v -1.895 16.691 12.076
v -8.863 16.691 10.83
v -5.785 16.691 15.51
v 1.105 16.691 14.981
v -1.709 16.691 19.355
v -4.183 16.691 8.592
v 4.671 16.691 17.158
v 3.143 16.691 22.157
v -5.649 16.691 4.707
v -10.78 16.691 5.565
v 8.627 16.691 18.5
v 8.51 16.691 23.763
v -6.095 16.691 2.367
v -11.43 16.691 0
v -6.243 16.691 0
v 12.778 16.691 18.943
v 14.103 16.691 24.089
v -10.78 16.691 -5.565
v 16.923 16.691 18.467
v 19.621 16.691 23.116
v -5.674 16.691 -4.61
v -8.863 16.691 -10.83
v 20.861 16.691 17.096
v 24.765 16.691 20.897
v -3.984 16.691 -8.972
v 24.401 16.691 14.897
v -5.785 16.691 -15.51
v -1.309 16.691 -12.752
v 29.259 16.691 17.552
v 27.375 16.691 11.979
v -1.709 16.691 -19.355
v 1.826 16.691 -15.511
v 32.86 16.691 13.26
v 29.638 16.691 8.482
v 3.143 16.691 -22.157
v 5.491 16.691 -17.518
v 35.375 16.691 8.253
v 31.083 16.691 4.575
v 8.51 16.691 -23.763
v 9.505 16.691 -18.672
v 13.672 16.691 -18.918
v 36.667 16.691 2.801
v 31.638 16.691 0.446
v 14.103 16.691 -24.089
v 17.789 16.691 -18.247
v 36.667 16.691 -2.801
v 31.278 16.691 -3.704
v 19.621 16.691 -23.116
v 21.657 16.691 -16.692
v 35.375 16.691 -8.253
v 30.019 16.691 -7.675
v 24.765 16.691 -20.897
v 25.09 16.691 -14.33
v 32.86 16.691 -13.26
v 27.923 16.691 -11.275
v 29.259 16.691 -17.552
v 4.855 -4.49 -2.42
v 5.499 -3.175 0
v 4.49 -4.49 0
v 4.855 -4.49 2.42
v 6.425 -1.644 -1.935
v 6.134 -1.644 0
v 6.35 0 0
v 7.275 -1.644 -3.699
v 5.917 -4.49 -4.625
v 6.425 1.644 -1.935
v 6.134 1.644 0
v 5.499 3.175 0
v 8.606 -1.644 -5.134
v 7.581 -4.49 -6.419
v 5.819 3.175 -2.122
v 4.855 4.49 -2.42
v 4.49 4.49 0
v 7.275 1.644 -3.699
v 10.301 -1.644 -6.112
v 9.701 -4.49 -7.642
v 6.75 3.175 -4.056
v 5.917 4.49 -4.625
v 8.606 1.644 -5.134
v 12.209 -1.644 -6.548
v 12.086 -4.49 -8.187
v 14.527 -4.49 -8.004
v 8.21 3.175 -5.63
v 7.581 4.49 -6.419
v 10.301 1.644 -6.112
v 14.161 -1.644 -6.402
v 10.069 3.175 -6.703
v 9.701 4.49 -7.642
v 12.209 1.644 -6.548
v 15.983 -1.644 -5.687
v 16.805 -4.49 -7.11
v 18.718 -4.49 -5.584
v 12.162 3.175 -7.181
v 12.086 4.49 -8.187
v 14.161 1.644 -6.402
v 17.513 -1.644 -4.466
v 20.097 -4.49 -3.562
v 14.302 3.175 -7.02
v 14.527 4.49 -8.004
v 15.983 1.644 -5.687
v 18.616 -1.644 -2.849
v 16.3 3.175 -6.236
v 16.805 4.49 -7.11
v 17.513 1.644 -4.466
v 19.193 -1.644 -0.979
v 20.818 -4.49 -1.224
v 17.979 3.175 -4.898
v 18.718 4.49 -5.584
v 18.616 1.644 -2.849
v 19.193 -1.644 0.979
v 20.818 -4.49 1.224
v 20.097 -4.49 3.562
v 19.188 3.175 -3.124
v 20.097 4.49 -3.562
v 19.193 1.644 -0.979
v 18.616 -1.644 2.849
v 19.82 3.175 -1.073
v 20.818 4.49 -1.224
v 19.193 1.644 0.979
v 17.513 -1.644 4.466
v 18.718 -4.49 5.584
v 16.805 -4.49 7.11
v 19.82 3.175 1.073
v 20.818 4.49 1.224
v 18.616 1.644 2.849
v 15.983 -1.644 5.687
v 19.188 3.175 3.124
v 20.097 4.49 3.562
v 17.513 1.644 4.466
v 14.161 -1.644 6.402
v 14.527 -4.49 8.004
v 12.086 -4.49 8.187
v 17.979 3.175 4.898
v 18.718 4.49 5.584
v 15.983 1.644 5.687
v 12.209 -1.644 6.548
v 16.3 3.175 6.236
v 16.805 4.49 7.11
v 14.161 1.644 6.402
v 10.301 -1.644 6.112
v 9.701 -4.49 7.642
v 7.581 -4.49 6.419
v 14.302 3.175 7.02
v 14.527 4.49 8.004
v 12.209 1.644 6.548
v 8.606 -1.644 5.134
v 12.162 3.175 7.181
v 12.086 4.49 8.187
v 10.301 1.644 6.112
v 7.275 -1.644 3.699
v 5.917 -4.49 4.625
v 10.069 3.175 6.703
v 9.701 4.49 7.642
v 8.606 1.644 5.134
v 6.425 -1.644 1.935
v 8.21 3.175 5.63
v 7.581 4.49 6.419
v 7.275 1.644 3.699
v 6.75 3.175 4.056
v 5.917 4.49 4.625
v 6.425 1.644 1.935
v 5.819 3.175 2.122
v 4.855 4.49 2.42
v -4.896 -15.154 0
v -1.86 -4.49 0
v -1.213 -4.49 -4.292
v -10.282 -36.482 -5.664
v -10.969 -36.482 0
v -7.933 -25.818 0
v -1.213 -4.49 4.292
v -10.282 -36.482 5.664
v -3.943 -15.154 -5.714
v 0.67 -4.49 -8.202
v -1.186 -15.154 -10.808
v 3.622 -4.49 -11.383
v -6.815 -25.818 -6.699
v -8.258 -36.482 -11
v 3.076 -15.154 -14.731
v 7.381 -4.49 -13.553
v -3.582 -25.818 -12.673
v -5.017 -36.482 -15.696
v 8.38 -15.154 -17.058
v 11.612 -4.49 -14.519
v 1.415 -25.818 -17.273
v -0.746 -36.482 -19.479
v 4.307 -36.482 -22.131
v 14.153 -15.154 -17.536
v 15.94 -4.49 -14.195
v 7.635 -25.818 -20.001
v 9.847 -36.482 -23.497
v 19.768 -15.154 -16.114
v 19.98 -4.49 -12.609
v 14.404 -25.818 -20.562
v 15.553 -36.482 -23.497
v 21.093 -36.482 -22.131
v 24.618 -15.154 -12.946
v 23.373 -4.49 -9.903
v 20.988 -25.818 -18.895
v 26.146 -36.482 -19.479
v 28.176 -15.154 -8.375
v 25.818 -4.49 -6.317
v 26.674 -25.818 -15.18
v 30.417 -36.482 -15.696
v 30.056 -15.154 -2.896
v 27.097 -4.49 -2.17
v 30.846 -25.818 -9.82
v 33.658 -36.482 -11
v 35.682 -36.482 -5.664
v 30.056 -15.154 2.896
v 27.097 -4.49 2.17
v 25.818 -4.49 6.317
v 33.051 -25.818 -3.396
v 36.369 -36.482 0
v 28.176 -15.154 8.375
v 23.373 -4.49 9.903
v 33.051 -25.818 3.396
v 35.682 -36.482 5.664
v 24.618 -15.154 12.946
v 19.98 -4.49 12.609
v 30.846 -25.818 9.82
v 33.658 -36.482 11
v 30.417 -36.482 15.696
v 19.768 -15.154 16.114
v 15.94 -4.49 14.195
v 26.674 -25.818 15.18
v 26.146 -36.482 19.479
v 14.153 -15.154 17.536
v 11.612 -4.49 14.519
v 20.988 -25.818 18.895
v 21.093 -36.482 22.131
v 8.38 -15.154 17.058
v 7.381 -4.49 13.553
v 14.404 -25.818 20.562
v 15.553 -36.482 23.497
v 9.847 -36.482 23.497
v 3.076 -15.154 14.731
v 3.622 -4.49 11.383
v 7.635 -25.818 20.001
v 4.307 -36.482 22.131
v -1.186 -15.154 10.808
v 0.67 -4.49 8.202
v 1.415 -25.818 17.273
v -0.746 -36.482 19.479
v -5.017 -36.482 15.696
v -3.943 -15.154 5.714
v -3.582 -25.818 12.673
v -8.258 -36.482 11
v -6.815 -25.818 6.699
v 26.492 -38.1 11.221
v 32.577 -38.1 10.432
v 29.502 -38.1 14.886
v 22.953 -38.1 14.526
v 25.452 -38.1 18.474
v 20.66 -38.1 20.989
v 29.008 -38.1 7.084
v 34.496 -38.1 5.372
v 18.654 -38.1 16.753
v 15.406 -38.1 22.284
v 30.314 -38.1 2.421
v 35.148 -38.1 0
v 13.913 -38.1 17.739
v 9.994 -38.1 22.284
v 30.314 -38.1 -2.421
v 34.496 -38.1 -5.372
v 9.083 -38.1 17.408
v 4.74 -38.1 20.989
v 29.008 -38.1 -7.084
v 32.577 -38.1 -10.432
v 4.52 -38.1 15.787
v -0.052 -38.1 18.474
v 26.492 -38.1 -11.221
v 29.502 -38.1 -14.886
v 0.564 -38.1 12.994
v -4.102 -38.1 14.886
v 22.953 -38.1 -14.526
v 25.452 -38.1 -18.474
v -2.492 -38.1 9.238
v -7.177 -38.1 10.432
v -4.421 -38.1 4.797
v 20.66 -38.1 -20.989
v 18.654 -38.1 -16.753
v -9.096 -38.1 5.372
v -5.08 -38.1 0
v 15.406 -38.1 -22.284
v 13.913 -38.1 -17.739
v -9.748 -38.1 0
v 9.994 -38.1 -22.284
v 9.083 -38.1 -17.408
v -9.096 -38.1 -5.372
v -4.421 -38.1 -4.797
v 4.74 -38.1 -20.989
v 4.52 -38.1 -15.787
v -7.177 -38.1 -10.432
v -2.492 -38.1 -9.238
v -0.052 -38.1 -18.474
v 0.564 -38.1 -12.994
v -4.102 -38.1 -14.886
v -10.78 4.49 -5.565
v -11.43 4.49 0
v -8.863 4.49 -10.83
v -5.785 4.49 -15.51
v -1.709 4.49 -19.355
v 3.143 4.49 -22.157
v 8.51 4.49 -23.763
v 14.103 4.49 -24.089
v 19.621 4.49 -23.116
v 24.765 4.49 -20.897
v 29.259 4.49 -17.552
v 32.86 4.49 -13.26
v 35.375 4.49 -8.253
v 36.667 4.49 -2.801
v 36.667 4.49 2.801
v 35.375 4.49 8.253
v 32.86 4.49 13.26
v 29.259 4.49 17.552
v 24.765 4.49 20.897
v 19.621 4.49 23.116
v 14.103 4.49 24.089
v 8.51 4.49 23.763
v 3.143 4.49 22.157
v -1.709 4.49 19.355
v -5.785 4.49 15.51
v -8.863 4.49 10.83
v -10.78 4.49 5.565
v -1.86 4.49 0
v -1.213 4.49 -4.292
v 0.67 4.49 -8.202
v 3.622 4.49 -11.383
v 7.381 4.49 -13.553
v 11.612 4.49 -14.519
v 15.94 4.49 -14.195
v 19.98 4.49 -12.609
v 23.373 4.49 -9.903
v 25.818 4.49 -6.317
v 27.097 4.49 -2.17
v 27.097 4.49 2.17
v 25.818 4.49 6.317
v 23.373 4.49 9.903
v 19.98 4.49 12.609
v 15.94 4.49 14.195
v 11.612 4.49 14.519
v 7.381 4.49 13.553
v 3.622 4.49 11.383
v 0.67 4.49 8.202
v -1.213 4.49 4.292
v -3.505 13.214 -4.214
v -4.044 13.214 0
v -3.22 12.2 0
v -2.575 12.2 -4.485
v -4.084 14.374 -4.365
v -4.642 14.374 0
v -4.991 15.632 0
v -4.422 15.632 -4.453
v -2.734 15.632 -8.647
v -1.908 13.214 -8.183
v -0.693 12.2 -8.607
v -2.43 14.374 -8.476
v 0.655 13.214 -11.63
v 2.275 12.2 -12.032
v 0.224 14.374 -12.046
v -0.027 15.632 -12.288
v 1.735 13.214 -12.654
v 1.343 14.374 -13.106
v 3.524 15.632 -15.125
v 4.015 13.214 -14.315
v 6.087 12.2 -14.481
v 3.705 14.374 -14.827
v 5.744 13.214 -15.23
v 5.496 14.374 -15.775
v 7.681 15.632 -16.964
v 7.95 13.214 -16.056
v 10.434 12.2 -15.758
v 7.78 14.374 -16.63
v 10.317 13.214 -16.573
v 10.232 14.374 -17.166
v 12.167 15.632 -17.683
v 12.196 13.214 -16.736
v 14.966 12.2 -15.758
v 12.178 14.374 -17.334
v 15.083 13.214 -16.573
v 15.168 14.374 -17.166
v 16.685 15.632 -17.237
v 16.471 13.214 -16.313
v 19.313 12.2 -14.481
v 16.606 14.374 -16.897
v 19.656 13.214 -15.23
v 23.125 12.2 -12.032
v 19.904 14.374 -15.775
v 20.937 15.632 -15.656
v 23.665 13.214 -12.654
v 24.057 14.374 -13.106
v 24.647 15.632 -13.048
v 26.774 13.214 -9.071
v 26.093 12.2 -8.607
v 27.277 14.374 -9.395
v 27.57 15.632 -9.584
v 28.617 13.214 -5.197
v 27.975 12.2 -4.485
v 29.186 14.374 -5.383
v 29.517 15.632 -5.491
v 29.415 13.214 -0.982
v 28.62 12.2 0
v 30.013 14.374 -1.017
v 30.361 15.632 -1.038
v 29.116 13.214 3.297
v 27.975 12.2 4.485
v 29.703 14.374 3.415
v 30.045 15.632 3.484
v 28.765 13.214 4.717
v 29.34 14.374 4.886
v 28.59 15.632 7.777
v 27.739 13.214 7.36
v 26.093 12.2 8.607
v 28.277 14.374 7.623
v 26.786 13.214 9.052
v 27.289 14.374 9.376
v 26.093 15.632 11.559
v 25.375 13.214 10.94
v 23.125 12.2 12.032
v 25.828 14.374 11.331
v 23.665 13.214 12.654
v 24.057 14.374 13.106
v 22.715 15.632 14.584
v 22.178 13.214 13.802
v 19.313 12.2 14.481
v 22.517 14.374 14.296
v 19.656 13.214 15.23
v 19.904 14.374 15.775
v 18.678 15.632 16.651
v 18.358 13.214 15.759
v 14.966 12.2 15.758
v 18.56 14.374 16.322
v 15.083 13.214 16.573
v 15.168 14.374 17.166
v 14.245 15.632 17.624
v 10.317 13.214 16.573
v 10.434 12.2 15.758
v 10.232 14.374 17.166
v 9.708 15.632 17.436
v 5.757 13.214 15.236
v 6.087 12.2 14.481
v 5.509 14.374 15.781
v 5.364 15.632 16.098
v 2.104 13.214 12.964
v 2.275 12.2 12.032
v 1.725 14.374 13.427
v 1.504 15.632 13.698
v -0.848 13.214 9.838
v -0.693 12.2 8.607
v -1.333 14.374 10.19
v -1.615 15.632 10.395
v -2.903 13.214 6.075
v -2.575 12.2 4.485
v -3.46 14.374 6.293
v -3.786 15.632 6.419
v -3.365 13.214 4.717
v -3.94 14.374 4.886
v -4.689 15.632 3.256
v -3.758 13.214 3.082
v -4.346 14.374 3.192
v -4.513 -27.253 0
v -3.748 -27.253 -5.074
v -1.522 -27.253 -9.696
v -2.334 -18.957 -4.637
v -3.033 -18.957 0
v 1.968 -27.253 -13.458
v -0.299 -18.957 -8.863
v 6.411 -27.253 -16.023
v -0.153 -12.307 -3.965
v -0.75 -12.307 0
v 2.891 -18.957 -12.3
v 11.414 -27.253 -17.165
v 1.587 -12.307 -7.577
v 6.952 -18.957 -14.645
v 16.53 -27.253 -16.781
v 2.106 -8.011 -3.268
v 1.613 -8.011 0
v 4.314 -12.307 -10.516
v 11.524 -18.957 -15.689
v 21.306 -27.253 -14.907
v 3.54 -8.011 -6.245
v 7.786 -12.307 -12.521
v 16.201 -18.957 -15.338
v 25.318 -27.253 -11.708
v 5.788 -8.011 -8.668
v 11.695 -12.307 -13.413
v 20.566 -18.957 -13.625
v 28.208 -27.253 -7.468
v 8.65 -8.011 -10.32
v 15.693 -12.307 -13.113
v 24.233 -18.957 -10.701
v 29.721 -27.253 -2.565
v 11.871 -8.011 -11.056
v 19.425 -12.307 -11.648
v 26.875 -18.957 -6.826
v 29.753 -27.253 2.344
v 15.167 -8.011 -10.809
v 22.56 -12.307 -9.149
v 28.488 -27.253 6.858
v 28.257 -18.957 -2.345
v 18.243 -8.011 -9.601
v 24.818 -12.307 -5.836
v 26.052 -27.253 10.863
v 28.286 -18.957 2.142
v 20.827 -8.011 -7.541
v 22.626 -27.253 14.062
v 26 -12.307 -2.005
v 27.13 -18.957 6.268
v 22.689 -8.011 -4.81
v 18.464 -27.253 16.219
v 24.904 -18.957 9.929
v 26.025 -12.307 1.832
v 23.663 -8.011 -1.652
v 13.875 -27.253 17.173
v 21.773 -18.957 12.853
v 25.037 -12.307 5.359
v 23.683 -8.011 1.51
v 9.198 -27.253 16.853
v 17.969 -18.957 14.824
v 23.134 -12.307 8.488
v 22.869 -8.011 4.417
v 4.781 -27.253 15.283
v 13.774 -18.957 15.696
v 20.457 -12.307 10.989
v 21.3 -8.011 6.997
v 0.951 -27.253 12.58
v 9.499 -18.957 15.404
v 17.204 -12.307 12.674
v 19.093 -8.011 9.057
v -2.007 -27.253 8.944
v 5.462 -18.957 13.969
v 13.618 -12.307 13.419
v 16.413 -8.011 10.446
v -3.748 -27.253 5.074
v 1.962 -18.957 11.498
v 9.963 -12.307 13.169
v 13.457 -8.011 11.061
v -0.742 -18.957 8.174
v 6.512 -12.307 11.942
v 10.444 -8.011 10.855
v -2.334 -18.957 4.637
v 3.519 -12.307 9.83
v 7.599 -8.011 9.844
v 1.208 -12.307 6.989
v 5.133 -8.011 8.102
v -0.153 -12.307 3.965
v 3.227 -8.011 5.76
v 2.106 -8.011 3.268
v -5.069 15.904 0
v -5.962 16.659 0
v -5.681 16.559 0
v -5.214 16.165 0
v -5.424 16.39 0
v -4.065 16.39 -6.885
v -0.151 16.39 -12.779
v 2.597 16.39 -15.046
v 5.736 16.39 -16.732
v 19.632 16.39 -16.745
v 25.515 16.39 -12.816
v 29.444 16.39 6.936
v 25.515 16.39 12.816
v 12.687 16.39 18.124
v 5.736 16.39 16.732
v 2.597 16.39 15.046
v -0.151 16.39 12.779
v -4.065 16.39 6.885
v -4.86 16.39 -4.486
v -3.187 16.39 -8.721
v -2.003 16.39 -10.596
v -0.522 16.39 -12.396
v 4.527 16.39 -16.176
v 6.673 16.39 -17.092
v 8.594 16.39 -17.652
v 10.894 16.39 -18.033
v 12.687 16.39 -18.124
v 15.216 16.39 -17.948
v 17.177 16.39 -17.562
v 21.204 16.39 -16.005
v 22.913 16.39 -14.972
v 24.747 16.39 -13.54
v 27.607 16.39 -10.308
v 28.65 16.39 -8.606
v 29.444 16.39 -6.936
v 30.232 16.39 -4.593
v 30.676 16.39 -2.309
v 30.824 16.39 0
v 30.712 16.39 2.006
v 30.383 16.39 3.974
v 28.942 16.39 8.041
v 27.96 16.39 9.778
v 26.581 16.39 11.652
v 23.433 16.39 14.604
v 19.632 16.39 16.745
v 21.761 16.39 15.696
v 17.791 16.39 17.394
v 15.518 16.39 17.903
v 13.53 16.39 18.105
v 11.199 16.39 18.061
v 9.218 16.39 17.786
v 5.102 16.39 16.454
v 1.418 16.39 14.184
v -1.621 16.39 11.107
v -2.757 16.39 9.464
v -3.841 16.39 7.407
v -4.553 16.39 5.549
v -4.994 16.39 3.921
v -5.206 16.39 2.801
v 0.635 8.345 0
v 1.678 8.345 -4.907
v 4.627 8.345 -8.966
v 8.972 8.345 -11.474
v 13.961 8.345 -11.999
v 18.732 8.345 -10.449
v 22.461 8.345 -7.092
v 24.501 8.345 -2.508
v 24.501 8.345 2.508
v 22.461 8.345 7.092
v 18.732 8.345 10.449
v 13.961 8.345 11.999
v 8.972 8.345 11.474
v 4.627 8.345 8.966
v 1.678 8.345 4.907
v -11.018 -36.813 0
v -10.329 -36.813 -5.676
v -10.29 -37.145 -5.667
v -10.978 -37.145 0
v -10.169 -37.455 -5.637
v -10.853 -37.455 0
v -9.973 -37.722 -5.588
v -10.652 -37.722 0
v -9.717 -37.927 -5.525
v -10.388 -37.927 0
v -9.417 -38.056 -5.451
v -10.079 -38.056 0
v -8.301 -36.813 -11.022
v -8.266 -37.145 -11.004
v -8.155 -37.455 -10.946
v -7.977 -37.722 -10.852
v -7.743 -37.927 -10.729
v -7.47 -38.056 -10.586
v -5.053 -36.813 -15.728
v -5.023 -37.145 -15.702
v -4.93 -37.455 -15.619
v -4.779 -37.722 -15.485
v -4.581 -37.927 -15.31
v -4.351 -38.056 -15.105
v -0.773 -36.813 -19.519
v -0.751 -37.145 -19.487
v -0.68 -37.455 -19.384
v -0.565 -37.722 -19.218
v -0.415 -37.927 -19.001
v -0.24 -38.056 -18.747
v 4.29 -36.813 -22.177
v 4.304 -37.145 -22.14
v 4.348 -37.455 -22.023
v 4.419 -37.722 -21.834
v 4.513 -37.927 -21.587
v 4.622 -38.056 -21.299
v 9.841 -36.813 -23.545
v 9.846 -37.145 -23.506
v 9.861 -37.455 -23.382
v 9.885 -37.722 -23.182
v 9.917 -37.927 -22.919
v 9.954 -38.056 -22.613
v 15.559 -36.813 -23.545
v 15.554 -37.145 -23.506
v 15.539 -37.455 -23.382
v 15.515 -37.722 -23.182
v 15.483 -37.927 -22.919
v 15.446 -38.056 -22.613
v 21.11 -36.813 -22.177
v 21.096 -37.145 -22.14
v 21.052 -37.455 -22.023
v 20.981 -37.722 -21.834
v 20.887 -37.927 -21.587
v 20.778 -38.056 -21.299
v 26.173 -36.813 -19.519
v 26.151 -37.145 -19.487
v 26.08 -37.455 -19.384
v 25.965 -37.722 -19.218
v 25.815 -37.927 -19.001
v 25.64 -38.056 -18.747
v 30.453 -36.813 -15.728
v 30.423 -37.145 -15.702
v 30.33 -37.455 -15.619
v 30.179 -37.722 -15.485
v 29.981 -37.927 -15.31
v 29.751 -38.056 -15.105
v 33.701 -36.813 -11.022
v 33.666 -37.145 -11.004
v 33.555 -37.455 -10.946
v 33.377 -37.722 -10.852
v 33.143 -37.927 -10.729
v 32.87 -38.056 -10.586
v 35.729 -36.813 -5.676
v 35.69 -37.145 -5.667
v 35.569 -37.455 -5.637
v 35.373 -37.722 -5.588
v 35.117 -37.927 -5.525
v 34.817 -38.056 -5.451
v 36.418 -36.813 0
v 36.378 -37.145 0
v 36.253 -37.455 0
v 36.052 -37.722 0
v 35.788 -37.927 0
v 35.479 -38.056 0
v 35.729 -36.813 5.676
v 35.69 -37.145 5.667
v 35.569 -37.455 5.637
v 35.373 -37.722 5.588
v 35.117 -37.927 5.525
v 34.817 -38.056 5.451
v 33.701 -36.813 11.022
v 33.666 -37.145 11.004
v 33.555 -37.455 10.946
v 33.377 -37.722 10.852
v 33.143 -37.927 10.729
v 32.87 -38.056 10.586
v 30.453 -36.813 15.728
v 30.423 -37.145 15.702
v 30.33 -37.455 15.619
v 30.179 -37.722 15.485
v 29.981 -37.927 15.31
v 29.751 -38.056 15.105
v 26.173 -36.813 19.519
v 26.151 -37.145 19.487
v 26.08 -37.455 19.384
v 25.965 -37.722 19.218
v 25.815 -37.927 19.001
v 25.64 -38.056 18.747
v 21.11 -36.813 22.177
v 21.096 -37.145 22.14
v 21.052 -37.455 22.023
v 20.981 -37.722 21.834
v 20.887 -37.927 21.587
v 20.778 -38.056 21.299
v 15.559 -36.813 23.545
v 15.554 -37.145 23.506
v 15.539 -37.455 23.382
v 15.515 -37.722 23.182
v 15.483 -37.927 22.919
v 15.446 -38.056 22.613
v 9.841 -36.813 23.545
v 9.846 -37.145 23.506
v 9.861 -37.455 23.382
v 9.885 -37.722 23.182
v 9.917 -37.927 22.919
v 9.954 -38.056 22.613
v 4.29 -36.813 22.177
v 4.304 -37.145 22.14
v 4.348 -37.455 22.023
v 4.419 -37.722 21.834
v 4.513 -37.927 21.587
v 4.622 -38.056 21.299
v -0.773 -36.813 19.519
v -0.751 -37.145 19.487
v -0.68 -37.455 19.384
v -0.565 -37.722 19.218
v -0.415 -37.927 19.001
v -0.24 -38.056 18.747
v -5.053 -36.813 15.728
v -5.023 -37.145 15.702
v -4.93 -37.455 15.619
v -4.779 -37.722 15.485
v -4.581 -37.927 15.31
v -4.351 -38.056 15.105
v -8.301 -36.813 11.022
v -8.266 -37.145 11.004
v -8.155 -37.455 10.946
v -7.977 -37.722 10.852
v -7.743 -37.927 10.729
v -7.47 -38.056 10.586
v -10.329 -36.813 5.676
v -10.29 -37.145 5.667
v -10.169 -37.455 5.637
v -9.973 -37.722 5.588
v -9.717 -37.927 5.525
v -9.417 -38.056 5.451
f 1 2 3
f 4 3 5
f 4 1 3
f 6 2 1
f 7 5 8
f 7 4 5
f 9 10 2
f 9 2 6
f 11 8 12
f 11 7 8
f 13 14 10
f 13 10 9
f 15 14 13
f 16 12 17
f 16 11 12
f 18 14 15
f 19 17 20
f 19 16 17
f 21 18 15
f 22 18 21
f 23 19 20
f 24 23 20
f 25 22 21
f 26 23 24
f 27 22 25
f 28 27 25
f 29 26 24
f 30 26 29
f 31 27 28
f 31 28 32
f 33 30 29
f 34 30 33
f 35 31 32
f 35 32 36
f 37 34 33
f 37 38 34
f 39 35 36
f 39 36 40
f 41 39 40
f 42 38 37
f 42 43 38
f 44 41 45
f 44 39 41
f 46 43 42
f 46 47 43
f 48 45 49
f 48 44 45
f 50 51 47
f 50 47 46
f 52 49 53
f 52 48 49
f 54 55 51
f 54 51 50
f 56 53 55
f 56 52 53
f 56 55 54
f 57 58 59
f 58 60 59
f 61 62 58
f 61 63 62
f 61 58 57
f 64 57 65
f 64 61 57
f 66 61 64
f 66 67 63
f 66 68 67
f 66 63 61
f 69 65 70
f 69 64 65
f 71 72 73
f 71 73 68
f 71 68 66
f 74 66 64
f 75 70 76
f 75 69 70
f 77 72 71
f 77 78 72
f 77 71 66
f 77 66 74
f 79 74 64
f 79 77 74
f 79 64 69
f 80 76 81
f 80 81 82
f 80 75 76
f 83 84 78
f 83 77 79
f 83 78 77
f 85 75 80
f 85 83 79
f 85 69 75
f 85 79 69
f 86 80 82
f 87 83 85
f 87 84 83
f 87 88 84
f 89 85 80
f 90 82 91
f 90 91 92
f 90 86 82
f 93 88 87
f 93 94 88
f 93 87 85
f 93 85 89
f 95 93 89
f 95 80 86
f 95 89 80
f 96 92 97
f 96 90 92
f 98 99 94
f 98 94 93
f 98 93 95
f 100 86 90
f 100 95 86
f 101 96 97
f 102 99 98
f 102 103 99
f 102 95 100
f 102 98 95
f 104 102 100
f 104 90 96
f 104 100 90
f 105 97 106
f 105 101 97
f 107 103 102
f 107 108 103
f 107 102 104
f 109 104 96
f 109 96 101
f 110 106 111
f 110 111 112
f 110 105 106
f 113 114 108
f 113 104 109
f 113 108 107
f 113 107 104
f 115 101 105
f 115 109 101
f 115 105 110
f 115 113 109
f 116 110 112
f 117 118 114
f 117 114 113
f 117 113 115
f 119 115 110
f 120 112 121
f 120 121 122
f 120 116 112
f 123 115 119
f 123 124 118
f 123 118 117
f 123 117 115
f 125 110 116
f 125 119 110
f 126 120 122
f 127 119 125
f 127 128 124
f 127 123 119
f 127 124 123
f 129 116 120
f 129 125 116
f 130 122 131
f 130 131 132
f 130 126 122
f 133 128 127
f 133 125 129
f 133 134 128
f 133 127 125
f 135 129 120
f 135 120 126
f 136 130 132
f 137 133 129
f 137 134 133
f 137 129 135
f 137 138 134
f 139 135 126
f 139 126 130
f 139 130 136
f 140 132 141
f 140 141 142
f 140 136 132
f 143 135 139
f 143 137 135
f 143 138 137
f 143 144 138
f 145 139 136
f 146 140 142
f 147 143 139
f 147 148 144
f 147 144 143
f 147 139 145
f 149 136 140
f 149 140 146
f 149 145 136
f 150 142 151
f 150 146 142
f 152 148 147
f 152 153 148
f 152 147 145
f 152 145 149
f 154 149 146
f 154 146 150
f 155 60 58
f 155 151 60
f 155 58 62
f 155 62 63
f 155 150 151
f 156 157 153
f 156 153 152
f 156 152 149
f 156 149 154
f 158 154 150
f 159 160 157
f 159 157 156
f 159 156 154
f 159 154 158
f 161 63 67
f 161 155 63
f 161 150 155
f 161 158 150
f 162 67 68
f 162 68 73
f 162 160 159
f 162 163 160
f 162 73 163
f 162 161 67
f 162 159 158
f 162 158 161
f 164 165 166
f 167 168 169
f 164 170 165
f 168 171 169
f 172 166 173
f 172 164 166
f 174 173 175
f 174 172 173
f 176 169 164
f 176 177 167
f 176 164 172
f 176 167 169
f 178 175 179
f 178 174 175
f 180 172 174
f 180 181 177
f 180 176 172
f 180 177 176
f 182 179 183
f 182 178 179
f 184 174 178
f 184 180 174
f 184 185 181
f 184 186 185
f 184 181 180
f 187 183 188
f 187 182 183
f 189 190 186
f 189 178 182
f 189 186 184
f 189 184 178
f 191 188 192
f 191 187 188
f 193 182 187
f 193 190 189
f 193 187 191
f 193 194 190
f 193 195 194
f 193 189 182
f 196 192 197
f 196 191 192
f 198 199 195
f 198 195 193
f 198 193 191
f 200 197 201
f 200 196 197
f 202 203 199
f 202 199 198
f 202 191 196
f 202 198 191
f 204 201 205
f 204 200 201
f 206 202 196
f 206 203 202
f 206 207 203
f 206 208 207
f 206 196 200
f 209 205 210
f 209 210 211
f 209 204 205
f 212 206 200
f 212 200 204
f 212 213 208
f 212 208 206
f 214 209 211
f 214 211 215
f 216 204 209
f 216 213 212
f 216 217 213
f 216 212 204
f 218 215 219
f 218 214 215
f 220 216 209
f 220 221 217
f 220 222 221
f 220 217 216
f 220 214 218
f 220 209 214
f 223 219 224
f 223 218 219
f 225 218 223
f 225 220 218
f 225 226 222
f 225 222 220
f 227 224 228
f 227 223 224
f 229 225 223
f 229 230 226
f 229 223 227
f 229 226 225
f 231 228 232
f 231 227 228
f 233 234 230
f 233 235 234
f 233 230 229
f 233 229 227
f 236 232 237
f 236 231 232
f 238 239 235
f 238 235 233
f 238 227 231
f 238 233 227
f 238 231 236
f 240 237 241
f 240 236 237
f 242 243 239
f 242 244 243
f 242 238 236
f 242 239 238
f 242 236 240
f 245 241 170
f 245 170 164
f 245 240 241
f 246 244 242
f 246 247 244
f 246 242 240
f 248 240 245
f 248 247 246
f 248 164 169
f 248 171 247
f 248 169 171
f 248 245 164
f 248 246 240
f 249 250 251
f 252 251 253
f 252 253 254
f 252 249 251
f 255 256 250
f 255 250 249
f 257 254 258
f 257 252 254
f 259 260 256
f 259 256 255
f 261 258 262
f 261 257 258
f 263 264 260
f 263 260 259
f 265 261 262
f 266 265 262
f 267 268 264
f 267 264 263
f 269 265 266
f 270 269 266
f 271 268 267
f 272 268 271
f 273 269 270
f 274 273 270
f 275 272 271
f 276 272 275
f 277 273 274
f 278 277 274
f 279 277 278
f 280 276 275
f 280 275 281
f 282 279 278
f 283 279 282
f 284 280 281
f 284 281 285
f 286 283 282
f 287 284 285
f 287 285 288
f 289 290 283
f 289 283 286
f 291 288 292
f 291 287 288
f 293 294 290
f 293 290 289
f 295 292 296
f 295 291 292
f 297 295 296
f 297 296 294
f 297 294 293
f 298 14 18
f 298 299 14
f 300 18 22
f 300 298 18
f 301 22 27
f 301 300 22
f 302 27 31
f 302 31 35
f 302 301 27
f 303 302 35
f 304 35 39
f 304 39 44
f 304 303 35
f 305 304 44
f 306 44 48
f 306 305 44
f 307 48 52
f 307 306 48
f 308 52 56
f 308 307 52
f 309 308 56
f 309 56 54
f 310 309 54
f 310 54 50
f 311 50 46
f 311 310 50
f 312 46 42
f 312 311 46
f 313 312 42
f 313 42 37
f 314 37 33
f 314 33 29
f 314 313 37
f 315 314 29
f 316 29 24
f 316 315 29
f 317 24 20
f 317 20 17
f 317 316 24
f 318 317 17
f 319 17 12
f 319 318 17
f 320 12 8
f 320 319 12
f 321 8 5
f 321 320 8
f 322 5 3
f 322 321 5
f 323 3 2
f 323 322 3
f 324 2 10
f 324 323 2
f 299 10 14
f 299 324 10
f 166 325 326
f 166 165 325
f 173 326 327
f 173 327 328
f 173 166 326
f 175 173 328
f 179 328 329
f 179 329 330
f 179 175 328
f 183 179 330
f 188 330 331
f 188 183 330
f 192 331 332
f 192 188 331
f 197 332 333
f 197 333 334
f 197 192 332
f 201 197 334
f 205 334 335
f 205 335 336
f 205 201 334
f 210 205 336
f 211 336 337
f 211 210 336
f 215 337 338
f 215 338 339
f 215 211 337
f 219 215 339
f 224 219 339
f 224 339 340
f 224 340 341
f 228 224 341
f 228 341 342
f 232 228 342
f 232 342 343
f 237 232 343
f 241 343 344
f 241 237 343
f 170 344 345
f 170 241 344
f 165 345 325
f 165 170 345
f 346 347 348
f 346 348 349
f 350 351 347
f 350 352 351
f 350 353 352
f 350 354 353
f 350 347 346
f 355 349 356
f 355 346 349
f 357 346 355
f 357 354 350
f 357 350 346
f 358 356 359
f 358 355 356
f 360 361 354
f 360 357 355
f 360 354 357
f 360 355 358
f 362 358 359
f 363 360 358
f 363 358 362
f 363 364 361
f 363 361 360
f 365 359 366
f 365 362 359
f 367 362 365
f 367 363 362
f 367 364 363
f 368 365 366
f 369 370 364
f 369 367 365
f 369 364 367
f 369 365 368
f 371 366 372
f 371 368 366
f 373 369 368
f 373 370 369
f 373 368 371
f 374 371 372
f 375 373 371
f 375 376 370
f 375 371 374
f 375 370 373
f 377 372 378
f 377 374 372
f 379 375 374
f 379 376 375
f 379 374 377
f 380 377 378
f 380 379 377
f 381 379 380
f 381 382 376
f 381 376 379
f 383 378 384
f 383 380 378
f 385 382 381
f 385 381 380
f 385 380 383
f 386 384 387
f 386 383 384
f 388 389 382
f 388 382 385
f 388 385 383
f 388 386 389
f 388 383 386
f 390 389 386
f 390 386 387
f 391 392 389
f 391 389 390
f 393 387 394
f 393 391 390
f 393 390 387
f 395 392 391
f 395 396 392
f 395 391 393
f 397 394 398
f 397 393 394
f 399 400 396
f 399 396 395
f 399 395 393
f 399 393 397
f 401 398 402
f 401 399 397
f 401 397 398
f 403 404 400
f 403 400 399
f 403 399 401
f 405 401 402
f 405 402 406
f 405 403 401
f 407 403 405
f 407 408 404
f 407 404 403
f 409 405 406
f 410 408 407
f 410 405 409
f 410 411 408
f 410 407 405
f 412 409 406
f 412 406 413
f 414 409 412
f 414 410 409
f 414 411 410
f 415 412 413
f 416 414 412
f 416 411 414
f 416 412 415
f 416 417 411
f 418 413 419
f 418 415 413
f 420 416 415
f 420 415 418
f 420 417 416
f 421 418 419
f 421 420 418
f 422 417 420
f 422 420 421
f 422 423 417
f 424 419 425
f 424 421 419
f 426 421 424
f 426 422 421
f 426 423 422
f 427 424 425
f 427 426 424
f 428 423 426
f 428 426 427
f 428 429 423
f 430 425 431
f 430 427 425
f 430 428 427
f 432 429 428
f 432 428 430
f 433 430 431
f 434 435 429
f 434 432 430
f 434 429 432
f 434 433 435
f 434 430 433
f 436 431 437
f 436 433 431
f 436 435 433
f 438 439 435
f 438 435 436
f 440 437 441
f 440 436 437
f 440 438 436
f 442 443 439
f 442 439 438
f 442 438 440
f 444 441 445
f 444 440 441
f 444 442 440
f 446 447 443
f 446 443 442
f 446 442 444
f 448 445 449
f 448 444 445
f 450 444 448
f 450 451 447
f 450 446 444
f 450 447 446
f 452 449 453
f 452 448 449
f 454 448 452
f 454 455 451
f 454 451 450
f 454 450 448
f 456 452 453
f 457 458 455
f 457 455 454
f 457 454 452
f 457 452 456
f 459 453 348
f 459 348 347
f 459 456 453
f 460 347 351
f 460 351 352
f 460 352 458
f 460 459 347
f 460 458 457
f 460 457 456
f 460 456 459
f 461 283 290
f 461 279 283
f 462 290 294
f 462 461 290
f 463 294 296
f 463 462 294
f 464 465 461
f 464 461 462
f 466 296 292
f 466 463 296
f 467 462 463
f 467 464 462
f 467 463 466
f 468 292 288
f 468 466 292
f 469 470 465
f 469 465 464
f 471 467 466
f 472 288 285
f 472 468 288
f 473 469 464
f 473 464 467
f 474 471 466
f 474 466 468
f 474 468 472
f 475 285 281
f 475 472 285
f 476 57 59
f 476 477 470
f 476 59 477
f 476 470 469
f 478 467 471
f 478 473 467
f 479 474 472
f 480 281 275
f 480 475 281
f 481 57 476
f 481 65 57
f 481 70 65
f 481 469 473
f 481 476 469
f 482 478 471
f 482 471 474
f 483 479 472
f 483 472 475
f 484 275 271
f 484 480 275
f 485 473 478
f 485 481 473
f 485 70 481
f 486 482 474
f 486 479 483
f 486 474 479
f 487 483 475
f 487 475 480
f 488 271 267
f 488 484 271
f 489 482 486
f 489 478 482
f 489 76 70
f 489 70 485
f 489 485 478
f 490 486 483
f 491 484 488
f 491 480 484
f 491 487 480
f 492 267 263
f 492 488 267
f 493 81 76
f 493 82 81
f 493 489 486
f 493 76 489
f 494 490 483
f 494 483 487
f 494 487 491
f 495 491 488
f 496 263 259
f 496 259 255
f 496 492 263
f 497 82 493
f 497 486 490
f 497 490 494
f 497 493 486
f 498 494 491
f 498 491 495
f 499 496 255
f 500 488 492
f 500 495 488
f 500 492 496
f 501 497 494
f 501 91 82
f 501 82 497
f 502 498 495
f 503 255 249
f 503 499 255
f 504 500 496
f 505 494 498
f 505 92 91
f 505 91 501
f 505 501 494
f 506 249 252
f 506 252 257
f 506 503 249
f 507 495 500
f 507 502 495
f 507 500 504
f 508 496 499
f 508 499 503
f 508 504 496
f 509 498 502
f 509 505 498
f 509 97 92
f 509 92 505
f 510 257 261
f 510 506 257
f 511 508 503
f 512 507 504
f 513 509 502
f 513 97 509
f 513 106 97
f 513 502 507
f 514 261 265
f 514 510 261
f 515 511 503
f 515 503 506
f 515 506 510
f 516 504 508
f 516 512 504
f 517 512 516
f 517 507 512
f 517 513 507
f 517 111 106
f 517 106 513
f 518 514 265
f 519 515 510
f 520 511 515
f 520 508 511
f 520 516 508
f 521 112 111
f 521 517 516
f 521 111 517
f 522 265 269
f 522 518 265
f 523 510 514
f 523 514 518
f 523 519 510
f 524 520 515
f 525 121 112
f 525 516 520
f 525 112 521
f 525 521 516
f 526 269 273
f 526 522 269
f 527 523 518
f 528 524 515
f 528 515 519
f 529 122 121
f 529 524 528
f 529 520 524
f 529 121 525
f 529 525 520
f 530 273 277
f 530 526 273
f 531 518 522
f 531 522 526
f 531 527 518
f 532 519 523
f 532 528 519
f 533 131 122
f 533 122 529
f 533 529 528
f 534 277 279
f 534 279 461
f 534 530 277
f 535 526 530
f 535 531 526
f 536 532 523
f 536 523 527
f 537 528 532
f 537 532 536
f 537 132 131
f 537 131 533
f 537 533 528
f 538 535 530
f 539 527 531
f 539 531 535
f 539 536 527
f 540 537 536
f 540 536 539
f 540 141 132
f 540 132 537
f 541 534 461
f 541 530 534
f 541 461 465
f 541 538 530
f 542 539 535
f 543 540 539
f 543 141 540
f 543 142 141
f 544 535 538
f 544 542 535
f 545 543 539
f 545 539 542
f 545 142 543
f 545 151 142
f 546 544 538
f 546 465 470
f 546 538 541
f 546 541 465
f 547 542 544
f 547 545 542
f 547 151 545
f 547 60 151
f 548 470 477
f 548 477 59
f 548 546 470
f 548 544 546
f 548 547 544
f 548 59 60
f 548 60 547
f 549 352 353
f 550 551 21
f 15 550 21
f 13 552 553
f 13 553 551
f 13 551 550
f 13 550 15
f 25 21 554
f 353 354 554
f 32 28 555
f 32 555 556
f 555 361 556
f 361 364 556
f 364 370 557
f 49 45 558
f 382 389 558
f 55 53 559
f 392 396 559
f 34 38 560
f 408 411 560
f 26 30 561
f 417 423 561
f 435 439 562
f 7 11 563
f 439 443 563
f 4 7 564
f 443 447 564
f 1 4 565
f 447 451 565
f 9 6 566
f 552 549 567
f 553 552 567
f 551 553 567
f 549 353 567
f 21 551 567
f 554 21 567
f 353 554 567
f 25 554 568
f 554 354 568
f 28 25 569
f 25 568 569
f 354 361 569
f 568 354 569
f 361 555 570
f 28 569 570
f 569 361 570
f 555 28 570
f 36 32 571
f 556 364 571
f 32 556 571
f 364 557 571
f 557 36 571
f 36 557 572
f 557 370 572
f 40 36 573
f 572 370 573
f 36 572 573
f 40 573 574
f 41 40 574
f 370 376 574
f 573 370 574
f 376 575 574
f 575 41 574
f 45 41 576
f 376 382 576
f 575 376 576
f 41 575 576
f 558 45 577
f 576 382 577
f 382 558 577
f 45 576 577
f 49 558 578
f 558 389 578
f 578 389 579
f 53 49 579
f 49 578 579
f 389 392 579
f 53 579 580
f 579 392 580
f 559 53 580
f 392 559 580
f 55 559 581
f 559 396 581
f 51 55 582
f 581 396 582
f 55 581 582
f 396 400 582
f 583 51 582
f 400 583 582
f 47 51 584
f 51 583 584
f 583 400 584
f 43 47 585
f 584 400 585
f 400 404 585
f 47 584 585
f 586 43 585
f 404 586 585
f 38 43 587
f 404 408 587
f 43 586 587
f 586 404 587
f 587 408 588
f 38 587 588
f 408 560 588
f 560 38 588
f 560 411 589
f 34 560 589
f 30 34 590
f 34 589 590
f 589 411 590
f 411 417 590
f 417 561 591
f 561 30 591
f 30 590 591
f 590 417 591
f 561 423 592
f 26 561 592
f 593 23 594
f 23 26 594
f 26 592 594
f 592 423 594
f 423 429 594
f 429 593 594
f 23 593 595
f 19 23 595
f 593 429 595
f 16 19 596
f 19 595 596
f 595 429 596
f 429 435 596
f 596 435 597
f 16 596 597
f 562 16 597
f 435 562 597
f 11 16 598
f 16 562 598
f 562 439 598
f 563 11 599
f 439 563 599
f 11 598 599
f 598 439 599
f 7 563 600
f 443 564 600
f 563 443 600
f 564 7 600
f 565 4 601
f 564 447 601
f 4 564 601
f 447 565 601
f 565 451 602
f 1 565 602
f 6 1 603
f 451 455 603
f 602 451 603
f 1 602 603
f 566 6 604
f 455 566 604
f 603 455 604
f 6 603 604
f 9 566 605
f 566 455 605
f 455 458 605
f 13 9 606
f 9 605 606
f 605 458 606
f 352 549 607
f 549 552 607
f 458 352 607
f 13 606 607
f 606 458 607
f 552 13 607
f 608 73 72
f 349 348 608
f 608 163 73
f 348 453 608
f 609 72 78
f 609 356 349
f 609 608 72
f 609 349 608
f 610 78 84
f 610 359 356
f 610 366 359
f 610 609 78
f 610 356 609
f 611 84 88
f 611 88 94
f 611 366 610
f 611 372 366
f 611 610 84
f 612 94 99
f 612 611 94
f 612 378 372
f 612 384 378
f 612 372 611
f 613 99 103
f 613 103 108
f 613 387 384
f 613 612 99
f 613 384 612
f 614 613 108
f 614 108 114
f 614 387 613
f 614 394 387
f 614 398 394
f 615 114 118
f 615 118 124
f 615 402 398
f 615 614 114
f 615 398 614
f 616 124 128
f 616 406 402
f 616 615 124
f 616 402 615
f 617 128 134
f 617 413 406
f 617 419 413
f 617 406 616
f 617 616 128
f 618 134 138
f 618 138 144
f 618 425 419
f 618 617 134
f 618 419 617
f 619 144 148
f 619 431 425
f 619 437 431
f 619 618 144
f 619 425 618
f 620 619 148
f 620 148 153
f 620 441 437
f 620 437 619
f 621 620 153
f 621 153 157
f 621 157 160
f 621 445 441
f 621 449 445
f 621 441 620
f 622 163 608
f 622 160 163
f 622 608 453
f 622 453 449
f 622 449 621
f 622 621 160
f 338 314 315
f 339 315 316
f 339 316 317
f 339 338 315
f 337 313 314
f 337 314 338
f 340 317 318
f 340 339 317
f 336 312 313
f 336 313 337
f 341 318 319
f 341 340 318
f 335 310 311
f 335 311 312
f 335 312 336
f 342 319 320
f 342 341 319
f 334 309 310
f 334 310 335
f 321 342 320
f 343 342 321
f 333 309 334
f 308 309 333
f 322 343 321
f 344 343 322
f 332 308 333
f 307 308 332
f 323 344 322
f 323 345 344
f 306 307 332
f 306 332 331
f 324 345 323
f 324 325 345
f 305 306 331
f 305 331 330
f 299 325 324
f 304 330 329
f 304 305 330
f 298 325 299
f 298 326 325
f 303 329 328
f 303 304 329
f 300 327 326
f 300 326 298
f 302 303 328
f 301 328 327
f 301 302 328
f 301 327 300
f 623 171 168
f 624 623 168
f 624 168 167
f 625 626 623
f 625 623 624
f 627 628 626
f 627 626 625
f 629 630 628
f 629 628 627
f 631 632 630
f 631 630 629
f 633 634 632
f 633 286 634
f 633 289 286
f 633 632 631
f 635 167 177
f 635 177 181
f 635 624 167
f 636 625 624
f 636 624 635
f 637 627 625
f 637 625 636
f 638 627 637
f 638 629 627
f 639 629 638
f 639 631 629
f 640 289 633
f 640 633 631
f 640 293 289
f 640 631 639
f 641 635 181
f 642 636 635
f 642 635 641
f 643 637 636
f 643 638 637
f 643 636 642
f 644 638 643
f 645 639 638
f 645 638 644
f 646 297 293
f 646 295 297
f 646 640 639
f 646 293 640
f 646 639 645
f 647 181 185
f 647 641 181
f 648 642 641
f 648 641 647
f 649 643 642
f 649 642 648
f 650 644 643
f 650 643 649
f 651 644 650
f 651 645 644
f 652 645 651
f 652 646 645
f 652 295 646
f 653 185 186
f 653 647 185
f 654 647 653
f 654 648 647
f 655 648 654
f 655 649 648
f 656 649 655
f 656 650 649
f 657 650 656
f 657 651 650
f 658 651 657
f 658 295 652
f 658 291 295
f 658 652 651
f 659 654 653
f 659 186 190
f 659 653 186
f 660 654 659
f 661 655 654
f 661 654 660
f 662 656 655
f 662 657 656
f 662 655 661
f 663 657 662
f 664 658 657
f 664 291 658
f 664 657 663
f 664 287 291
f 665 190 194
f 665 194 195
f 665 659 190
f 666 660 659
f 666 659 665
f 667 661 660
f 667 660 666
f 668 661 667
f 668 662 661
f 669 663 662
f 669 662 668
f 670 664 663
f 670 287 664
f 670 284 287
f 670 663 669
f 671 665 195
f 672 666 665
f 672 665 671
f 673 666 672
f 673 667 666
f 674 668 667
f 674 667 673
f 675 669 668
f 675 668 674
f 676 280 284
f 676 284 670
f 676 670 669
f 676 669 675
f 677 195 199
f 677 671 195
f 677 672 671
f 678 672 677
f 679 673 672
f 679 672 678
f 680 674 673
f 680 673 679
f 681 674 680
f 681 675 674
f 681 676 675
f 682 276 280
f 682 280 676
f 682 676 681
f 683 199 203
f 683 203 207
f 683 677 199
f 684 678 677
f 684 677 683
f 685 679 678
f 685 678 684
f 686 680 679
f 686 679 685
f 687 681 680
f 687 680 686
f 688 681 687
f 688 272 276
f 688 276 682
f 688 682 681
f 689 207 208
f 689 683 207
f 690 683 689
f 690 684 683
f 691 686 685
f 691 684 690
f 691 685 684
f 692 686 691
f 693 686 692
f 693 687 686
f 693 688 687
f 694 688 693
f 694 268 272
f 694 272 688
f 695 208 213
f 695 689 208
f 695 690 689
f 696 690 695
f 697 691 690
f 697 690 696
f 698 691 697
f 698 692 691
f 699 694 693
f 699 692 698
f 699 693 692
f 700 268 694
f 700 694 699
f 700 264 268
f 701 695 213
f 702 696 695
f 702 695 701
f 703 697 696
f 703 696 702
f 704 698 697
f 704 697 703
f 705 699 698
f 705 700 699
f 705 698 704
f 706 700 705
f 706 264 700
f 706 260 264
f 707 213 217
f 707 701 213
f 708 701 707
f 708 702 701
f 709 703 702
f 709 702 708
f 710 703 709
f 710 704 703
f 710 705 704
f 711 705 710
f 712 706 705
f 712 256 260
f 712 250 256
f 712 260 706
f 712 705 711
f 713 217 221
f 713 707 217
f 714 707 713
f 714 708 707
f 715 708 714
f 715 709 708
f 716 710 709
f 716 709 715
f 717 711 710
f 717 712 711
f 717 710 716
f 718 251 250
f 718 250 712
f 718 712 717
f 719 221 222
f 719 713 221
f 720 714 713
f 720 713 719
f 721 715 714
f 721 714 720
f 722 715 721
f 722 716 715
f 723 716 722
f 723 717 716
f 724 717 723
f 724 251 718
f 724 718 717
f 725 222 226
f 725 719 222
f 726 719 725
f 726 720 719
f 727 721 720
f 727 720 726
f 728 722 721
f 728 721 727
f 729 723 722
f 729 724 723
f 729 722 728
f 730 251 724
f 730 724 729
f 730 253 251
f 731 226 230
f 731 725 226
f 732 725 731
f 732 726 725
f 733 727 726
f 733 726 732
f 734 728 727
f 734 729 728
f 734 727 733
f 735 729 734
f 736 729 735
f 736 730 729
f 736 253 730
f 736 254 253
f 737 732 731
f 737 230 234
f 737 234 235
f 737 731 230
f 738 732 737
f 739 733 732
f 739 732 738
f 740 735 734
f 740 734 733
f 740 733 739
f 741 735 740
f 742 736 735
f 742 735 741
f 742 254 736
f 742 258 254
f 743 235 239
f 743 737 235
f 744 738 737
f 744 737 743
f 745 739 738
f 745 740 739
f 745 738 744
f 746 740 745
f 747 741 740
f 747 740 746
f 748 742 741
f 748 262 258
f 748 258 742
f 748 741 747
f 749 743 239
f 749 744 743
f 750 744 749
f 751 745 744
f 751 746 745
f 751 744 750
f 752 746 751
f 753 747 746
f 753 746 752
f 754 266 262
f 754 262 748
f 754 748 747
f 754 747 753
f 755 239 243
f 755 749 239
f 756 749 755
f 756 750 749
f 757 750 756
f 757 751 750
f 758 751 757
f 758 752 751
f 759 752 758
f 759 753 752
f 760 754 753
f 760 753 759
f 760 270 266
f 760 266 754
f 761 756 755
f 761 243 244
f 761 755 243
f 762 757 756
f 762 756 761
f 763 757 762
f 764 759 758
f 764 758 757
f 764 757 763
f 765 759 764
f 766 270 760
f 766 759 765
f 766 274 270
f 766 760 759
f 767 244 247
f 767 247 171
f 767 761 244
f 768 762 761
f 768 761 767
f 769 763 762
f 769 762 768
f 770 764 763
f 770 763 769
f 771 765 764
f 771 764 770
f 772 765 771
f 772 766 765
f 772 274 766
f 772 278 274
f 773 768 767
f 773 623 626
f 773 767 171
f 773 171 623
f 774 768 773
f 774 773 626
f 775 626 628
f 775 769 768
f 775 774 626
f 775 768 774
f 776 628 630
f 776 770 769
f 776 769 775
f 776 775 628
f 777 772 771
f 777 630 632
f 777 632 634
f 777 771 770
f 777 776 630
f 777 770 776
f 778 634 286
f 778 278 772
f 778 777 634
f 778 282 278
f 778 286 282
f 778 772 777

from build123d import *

# Parameters (mm, degrees)
FILLET1_R = 1.27


with BuildPart() as part:
    # Sketch2 → Revolve1 (revolve)
    with BuildSketch(Plane.XY):
        with BuildLine():
            Line((4.490128061, 4.490128061), (-3.220128061, 12.200384182))
            ThreePointArc((-3.220128061, 12.200384182), (-4.596635031, 14.260472447), (-5.08, 16.690512242))
            Line((-5.08, 16.690512242), (-11.43, 16.690512242))
            Line((-11.43, 16.690512242), (-11.43, 4.490128061))
            Line((-11.43, 4.490128061), (-1.859871939, 4.490128061))
            Line((-1.859871939, 4.490128061), (-1.859871939, -4.490128061))
            Line((-1.859871939, -4.490128061), (-11.43, -38.1))
            Line((-11.43, -38.1), (-5.08, -38.1))
            add(Edge.make_bspline(
                [(-5.08, -38.1), (-5.08, -14.060256121), (4.490128061, -4.490128061)],
                knots=[0, 0, 0, 1, 1, 1], degree=2))
            ThreePointArc((4.490128061, -4.490128061), (6.35, 0), (4.490128061, 4.490128061))
        make_face()
    revolve(axis=Axis((12.7, 19.649377631, 0), (0, -1, 0)))

    # Fillet1
    fillet1_edges = [part.edges().sort_by_distance(p)[0] for p in [
        (36.83, -38.1, 0),
        (30.48, 16.690512242, 0),
    ]]
    fillet(fillet1_edges, radius=FILLET1_R)


solid = part.part
